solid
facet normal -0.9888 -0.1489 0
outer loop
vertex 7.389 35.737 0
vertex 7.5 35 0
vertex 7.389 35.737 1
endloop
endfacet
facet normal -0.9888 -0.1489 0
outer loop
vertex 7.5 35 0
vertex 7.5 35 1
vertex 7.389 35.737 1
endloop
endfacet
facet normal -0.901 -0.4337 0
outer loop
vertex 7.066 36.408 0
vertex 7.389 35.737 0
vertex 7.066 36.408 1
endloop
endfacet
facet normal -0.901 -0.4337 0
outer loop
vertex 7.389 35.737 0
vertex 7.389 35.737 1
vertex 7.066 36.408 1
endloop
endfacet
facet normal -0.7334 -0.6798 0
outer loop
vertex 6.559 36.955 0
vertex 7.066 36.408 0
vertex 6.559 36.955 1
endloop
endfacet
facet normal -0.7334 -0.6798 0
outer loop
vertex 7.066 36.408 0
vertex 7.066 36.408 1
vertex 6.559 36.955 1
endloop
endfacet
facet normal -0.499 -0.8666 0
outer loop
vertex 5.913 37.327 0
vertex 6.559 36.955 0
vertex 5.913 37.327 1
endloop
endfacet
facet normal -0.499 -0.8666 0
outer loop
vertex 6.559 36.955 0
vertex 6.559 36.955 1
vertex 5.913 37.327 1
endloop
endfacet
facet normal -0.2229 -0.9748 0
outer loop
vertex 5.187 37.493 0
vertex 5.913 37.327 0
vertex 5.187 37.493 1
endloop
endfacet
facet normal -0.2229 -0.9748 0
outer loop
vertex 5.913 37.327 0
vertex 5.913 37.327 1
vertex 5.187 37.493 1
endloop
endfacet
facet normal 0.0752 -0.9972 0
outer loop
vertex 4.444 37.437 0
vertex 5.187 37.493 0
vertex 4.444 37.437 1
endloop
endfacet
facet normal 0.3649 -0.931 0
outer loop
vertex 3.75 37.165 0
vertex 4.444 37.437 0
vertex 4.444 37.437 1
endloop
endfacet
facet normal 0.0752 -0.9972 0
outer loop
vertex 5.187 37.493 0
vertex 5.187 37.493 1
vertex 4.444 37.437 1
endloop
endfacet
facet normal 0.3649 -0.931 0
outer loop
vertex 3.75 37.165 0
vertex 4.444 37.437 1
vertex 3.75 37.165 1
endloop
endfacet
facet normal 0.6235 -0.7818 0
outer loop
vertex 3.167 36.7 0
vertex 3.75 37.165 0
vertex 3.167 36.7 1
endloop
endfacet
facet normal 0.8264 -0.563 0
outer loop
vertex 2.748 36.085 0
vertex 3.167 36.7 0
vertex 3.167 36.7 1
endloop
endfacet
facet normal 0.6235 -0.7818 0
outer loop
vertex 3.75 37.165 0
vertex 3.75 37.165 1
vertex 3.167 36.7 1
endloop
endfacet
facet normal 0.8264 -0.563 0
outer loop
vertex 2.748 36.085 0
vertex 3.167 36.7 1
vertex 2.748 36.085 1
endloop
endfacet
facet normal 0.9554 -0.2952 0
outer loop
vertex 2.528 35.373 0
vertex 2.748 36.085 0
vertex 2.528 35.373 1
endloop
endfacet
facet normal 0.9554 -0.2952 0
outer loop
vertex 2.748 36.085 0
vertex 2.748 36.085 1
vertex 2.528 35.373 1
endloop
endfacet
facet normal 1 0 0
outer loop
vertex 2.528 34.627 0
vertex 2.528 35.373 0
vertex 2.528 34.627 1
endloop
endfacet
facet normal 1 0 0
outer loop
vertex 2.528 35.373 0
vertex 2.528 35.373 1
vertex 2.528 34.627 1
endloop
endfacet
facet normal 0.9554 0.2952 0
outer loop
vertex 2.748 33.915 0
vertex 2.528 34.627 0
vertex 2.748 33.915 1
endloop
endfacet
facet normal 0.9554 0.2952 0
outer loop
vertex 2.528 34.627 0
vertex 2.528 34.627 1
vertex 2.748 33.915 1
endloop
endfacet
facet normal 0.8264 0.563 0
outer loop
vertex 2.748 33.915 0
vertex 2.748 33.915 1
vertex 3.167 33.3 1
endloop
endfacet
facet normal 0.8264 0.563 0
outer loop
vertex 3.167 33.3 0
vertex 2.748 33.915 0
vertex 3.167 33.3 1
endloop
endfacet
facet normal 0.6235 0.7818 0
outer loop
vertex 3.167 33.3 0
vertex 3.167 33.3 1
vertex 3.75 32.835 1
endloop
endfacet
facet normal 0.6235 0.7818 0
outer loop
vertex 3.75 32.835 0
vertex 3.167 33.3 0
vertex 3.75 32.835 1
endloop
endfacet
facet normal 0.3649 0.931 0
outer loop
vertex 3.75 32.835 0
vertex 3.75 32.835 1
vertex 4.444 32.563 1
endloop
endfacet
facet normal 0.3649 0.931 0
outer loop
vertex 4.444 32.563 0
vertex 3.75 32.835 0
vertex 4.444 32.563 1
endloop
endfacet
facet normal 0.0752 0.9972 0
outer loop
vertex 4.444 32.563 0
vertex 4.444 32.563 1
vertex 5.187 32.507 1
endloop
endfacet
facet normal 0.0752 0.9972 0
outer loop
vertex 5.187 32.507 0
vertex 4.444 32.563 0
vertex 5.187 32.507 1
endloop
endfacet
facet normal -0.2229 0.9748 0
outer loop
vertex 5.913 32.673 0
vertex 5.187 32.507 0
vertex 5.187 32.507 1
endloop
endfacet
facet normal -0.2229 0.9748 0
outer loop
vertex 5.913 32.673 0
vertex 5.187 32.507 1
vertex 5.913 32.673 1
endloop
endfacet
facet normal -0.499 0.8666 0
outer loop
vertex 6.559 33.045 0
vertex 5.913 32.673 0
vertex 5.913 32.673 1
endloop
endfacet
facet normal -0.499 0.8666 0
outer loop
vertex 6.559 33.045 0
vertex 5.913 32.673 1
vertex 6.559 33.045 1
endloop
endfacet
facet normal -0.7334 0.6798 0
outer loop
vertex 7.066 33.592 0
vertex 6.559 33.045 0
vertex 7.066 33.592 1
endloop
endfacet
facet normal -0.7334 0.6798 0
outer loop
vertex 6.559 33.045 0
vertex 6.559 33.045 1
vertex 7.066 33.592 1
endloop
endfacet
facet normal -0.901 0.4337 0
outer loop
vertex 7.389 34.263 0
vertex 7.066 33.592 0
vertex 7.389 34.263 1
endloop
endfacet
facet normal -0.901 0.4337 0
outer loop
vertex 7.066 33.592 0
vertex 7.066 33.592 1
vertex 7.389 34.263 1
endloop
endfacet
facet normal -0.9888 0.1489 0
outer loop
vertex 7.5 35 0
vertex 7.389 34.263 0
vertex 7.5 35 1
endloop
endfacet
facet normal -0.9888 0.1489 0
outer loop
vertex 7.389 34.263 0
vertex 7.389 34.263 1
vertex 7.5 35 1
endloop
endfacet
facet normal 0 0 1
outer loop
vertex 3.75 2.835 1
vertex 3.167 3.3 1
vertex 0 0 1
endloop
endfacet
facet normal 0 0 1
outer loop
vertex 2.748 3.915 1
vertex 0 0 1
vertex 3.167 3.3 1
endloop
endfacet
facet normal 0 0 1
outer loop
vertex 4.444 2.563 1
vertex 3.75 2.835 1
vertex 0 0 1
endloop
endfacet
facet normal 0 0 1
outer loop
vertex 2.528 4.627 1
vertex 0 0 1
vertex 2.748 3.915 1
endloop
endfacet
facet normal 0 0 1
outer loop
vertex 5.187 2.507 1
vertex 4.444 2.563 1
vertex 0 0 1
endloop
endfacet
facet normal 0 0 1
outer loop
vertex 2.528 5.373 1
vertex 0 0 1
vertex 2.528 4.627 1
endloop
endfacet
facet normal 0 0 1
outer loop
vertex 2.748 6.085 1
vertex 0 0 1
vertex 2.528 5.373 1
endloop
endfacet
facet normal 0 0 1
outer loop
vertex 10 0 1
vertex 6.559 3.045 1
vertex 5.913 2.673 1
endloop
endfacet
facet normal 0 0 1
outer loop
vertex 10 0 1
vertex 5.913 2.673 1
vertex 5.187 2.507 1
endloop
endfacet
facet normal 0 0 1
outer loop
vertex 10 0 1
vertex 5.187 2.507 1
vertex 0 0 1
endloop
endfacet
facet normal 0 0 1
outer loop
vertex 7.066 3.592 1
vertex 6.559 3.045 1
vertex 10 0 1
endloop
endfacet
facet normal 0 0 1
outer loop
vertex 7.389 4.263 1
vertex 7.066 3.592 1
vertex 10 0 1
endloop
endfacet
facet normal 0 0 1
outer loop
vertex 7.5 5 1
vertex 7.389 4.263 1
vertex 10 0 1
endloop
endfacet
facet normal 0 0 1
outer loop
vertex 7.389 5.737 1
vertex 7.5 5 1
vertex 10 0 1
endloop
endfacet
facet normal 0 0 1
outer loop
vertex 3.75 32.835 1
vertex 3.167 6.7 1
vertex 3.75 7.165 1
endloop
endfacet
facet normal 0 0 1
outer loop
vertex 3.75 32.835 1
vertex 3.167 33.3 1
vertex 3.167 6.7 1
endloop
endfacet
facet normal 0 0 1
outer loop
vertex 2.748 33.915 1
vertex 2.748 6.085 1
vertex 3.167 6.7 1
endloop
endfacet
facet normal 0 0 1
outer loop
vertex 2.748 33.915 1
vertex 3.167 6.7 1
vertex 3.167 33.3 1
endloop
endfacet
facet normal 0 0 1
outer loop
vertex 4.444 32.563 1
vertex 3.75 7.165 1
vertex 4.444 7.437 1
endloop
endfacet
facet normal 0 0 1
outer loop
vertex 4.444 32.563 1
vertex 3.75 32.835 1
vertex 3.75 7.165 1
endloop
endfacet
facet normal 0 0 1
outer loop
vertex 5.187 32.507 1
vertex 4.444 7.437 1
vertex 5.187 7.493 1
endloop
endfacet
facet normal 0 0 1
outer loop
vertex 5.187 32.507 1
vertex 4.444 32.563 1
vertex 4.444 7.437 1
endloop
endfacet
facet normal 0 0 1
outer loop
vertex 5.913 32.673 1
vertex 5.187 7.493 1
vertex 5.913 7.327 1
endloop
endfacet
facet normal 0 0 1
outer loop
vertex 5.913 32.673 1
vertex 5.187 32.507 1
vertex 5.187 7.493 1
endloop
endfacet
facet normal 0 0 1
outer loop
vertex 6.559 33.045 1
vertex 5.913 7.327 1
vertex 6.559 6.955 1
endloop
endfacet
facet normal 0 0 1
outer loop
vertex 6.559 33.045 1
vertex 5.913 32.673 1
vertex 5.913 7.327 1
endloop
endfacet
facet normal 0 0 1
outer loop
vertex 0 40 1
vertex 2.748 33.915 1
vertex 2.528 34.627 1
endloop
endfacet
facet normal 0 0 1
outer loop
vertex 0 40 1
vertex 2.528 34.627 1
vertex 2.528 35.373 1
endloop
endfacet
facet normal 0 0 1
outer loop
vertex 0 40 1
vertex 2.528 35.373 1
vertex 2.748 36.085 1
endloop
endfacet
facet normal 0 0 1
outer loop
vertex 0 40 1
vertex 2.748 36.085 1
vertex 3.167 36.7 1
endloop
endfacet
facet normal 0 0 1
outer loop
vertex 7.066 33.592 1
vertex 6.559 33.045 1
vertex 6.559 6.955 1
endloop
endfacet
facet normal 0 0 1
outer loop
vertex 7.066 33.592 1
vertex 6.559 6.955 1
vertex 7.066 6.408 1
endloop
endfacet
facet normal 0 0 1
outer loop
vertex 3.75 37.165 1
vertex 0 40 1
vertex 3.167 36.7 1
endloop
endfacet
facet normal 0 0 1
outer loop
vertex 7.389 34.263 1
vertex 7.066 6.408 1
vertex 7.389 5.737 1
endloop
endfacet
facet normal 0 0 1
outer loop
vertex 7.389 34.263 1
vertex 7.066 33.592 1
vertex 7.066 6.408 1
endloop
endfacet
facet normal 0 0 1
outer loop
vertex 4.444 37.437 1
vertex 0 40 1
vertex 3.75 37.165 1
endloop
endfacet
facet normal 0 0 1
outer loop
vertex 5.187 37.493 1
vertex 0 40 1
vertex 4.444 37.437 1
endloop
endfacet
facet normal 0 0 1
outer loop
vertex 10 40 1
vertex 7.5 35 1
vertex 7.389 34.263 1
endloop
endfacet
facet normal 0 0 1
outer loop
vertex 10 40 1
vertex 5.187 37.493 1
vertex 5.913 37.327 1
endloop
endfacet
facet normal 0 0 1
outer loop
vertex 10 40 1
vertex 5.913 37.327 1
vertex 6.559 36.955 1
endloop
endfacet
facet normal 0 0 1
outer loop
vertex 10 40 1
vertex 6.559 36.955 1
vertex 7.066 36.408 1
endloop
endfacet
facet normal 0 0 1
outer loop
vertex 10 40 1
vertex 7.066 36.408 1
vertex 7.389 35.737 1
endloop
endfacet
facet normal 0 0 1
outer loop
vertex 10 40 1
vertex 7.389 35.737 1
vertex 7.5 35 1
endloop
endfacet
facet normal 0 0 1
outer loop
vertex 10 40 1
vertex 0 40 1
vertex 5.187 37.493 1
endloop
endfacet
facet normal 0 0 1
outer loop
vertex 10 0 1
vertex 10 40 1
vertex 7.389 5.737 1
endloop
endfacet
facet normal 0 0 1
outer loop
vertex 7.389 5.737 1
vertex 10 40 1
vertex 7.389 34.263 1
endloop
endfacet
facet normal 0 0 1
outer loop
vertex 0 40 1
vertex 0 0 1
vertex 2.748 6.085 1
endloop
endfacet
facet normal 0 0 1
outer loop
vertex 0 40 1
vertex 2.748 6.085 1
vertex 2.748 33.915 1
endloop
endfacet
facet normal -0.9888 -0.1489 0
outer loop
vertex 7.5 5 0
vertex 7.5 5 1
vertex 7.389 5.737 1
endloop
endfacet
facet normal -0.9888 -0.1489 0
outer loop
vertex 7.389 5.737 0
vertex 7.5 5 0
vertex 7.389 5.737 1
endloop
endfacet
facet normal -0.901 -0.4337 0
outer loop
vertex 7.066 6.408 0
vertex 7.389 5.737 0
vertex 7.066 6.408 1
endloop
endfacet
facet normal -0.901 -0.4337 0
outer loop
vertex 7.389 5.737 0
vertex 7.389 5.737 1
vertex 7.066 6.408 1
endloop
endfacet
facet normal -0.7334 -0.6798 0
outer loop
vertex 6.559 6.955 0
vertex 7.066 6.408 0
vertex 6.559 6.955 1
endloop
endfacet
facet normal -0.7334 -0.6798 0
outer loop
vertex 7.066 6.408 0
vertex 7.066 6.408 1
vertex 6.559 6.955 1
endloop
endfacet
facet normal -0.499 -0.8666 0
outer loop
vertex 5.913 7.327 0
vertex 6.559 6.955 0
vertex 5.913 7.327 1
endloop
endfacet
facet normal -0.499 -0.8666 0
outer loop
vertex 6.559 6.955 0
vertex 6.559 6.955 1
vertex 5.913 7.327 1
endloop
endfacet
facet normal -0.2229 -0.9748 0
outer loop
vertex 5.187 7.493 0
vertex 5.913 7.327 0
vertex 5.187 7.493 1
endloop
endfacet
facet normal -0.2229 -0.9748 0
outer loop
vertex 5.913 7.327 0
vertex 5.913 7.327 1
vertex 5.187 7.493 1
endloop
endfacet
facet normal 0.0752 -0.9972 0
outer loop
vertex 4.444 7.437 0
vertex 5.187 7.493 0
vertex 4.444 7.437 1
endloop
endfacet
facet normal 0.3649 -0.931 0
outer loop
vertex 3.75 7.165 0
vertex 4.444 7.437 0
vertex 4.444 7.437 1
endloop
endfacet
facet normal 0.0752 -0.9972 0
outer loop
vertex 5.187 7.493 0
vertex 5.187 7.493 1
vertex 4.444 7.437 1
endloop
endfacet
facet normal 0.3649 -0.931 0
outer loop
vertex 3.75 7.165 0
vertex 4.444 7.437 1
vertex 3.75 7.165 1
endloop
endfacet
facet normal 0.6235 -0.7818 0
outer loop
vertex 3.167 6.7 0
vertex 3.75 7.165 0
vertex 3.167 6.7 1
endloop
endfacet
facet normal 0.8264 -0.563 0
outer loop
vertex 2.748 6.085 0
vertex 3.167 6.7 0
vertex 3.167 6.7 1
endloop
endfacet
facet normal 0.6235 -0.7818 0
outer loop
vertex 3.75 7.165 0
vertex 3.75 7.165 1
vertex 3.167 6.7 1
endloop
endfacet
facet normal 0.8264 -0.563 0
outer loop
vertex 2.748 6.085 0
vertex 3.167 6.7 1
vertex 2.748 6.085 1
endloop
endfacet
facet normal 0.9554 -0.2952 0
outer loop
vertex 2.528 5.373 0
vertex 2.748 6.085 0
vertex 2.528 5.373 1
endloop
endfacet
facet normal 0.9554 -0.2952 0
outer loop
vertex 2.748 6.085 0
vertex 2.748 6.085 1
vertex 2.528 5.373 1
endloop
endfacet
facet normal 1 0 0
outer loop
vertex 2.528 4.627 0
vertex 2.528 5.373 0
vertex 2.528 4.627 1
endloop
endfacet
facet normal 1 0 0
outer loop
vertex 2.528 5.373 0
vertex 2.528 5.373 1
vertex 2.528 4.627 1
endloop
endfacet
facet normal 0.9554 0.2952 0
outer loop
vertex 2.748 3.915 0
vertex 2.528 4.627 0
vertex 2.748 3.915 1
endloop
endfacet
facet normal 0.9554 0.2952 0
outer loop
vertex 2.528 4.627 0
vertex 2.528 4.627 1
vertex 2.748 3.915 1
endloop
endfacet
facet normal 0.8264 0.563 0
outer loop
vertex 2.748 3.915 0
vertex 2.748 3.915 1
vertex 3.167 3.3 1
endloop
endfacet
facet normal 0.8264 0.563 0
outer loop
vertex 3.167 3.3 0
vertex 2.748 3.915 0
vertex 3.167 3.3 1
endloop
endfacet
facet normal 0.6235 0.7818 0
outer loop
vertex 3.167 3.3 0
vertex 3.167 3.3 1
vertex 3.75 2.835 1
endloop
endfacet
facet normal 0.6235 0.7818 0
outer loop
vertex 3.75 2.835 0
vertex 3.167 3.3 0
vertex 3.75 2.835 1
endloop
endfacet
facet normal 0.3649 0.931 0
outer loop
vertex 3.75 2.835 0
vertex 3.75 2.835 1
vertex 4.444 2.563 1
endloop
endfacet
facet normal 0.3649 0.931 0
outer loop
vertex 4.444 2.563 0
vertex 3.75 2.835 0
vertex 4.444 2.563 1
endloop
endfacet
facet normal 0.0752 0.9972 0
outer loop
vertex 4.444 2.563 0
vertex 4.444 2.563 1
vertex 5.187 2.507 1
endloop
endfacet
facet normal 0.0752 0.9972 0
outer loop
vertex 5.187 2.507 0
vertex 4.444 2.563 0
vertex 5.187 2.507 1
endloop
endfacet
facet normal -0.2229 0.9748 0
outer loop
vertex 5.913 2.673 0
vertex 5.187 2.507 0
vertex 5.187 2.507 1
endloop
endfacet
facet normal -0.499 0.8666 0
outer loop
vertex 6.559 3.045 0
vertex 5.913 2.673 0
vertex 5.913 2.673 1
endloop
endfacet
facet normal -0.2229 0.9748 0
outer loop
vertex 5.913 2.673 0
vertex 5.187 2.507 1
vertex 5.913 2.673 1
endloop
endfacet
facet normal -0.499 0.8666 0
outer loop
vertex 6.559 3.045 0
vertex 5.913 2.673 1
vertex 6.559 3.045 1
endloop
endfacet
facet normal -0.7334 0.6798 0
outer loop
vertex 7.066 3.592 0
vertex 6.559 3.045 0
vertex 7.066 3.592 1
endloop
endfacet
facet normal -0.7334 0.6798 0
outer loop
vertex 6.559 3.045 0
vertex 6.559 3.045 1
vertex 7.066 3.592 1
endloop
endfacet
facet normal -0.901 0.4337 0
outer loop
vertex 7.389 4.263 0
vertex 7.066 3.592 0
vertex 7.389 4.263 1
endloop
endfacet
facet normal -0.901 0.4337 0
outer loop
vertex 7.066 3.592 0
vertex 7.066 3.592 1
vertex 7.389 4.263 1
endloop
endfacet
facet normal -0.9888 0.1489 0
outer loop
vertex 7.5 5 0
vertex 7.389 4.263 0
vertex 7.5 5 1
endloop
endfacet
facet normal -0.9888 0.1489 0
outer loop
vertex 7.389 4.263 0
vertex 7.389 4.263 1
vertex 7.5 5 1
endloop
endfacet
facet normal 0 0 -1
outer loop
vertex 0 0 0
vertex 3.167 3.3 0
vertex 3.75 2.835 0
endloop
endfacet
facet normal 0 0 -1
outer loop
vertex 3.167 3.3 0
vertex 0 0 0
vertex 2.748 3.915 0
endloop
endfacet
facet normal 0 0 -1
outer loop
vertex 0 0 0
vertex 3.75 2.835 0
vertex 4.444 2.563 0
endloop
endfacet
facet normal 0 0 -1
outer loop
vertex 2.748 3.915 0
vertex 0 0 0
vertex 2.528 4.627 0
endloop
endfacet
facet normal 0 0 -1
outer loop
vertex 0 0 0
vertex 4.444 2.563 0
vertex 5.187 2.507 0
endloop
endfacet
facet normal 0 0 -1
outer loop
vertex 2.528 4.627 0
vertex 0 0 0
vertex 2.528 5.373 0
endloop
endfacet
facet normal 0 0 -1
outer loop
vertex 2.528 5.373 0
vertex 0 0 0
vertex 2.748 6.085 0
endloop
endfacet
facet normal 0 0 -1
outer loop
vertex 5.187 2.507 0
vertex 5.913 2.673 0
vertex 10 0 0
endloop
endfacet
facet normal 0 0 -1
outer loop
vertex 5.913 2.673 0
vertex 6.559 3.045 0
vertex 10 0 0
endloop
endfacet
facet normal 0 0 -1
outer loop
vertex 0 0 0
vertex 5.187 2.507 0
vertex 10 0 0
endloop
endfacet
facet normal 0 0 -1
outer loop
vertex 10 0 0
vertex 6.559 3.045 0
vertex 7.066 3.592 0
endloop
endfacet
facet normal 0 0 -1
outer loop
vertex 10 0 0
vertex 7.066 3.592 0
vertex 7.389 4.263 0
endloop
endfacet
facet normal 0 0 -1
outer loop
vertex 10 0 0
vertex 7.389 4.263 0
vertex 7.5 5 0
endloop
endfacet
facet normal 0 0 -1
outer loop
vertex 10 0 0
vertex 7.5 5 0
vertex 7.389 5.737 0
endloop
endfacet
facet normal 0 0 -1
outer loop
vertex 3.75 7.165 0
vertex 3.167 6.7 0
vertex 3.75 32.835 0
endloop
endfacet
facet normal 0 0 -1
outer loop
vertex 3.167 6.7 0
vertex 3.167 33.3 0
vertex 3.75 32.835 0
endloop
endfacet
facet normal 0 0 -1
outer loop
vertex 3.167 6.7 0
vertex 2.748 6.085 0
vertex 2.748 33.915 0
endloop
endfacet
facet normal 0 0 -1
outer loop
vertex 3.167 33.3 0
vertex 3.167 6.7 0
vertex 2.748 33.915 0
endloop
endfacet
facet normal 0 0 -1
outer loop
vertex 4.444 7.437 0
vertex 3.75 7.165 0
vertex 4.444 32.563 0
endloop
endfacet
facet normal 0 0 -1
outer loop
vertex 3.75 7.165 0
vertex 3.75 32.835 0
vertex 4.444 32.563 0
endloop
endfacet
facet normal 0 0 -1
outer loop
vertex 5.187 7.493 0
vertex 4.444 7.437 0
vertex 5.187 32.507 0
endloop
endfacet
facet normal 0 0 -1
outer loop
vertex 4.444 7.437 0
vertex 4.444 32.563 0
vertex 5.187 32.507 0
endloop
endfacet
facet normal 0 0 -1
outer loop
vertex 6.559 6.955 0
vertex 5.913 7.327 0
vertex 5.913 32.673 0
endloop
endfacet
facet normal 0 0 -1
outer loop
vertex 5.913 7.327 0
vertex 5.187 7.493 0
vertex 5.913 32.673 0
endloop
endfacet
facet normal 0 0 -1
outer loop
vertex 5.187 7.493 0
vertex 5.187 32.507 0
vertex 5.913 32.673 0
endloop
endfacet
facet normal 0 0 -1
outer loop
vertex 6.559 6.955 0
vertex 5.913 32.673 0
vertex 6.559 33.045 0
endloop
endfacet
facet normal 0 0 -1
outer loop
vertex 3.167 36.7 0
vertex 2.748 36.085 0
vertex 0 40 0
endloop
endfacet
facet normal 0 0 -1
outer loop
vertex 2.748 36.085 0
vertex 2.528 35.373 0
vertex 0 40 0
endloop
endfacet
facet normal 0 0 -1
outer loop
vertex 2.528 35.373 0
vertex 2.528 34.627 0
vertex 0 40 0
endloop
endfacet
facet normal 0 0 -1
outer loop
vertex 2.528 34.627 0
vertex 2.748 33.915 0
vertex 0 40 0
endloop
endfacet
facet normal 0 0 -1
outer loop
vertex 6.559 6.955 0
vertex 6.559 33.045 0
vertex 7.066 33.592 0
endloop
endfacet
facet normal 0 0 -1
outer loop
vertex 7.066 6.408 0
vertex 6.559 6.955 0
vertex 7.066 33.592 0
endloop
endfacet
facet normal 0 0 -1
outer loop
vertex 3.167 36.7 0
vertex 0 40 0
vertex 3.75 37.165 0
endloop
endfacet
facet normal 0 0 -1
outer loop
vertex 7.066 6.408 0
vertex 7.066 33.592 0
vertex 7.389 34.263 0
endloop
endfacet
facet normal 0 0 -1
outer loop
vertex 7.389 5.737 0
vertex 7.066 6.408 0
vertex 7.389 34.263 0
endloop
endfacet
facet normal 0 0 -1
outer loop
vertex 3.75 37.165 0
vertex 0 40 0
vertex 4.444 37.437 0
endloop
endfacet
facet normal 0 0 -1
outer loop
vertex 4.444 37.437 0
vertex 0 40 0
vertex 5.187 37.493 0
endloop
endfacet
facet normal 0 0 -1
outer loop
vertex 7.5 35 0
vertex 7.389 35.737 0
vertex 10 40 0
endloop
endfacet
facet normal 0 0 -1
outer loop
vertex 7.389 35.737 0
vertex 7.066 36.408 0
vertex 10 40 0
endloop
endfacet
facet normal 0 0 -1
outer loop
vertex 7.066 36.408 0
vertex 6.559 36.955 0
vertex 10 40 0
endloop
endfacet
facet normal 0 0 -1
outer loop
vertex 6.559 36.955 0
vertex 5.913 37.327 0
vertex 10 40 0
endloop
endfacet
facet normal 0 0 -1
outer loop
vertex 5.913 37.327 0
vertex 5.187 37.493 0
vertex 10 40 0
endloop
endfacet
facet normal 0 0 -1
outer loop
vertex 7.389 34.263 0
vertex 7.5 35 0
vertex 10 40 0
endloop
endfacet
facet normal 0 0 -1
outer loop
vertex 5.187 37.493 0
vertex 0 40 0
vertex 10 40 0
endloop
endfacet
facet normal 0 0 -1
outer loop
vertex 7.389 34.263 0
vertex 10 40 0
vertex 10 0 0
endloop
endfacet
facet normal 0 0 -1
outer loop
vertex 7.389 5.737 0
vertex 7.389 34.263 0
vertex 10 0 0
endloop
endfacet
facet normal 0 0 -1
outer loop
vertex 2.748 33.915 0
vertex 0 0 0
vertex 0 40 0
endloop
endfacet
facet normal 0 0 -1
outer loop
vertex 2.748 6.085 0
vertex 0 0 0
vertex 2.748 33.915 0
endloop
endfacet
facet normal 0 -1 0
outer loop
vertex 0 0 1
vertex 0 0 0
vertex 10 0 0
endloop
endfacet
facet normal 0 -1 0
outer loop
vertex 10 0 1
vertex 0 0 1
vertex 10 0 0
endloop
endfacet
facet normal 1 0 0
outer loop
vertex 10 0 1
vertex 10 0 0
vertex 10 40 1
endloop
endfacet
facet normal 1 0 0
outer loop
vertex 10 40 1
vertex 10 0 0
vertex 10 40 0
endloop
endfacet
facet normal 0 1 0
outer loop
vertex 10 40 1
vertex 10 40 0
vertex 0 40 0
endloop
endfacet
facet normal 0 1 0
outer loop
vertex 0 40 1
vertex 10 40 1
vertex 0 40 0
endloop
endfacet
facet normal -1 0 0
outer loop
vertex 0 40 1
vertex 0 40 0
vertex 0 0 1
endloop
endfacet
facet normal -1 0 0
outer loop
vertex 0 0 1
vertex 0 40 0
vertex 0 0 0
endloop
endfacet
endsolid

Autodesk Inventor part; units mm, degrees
ref_plane "YZ Plane" through (0, 0, 0) normal (1, 0, 0) x (0, 1, 0)
ref_plane "XZ Plane" through (0, 0, 0) normal (0, 1, 0) x (-1, 0, 0)
ref_plane "XY Plane" through (0, 0, 0) normal (0, 0, 1) x (1, 0, 0)
sketch "Sketch1" plane through (0, 0, 0) normal (0, 0, 1) x (1, 0, 0)
  line L0 (0, 0) -> (10, 0)
  line L1 (10, 0) -> (10, 40)
  line L2 (10, 40) -> (0, 40)
  line L3 (0, 40) -> (0, 0)
  dimension "d0" = 10
  dimension "d1" = 40
extrude "Extrusion1" add sketch "Sketch1" along normal blind 1
sketch "Sketch2" plane through (0, 0, 1) normal (0, 0, 1) x (1, 0, 0)
  line L0 (10, 40) -> (0, 40) projected
  line L1 (0, 40) -> (5, 40)
  line L2 (5, 40) -> (5, 35)
  circle A0 centre (5, 35) radius 2.5
  line L3 (0, 0) -> (1, 0)
  line L4 (1, 0) -> (5, 0)
  line L5 (0, 0) -> (10, 0) projected
  line L6 (5, 0) -> (5, 5)
  circle A1 centre (5, 5) radius 2.5
  dimension "d4" = 5
  dimension "d5" = 5
  dimension "d6" = 5
  dimension "d7" = 1
  dimension "d8" = 4
  dimension "d9" = 5
  dimension "d10" = 5
extrude "Extrusion2" cut sketch "Sketch2" against normal blind 1
sketch "Sketch3" plane through (0, 0, 1) normal (0, 0, 1) x (1, 0, 0)
  circle A0 centre (4.7625, 4.7625) radius 4
  point P0 (0, 0)
  dimension "d13" = 8
properties part number "crank"
